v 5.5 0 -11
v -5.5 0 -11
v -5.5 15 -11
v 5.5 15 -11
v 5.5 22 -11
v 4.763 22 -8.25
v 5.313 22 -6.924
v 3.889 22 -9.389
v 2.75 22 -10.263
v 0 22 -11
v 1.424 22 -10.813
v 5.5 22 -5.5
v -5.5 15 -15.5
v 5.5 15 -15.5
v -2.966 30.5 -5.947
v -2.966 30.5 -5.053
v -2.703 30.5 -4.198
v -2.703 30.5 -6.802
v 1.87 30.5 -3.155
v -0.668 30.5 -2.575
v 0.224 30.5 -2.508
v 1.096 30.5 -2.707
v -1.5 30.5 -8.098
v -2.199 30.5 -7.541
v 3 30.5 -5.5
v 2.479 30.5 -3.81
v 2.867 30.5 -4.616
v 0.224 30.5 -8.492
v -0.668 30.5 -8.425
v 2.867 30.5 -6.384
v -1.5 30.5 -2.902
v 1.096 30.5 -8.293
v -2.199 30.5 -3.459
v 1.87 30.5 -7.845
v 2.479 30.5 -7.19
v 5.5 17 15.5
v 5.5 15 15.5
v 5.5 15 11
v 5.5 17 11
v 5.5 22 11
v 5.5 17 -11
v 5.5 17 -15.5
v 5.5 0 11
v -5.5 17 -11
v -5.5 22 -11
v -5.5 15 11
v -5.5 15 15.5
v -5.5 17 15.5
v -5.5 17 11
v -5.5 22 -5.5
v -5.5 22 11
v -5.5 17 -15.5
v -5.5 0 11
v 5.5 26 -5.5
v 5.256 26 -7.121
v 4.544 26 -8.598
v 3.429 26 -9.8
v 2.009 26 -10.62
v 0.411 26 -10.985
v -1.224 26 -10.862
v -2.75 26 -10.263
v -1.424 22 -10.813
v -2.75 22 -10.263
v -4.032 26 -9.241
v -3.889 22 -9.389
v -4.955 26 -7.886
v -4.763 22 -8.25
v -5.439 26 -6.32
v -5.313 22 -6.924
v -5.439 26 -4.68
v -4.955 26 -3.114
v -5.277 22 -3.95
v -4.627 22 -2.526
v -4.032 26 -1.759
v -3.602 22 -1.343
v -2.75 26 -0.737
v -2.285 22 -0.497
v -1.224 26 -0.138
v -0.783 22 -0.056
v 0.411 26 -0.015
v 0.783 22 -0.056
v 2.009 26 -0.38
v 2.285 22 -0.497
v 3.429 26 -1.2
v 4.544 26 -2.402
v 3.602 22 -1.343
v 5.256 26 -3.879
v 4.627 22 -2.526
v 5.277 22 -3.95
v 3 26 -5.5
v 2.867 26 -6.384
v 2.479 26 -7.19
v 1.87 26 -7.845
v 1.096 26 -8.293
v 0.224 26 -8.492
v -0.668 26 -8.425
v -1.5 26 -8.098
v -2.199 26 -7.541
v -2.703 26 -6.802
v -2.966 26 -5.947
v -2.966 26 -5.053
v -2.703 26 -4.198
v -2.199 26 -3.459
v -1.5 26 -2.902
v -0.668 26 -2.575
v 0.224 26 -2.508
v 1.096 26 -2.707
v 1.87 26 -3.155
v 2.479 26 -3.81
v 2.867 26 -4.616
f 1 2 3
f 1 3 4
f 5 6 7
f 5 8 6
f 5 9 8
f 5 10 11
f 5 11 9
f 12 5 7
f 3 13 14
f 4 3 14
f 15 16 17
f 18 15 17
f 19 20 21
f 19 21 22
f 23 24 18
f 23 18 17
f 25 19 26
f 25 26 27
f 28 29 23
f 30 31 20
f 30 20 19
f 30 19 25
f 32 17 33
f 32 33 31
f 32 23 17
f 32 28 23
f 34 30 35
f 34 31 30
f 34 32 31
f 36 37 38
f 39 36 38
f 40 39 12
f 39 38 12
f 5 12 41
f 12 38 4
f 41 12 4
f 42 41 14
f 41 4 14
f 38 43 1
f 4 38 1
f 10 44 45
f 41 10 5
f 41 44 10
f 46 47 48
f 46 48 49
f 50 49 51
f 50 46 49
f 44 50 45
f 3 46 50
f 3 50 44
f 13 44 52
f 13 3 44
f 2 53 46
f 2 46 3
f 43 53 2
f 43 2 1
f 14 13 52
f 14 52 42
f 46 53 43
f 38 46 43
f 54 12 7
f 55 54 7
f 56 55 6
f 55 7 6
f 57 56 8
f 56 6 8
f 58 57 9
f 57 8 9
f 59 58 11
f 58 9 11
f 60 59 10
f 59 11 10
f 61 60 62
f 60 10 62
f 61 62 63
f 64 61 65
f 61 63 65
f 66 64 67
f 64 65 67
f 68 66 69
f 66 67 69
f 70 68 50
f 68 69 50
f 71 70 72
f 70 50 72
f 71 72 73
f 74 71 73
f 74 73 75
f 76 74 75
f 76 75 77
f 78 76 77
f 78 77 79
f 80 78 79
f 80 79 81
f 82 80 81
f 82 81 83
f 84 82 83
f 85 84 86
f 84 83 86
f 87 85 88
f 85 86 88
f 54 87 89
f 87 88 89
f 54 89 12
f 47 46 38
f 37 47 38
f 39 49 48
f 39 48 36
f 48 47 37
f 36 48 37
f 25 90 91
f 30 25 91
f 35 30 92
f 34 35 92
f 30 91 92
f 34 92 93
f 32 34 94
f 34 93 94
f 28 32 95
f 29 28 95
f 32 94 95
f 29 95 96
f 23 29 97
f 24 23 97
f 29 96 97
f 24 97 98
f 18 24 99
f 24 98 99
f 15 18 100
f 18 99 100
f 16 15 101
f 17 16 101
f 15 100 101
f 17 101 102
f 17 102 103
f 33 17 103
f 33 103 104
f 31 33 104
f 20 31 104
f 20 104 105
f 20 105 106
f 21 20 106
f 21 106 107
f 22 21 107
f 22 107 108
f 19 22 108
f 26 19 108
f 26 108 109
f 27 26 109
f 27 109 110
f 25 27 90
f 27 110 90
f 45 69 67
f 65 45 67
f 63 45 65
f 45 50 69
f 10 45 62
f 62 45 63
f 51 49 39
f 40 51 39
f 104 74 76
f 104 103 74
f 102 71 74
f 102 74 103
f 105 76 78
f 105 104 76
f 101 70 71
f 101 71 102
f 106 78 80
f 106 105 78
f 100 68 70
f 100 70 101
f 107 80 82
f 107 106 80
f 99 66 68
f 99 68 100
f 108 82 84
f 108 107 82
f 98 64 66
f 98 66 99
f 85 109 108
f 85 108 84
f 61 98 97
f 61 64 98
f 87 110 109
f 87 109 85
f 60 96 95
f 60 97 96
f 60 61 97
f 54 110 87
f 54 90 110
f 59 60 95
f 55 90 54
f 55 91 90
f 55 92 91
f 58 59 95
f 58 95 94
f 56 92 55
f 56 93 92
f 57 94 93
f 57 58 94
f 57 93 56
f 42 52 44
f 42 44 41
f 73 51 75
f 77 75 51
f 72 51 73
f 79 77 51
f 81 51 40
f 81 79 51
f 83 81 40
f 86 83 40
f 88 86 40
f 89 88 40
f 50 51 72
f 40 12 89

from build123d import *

# Parameters (mm, degrees)
SKETCH2_W           = 11
SKETCH2_H           = 22
BOSS_EXTRUDE1_DEPTH = 22
SKETCH3_W           = 11
SKETCH3_H           = 4.5
BOSS_EXTRUDE2_DEPTH = 2
SKETCH4_R           = 5.5
BOSS_EXTRUDE3_DEPTH = 4
SKETCH5_R           = 3
BOSS_EXTRUDE4_DEPTH = 4.5


with BuildPart() as part:
    # Sketch2 → Boss-Extrude1 (new body)
    with BuildSketch(Plane(origin=(0, 0, 0), x_dir=(1, 0, 0), z_dir=(0, 1, 0))):
        Rectangle(SKETCH2_W, SKETCH2_H)
    extrude(amount=BOSS_EXTRUDE1_DEPTH)

    # Sketch3 → Boss-Extrude2 (add)
    with BuildSketch(Plane(origin=(0, 15, 0), x_dir=(1, 0, 0), z_dir=(0, 1, 0))):
        with Locations((0, 13.25)):
            Rectangle(SKETCH3_W, SKETCH3_H)
        with Locations((0, -13.25)):
            Rectangle(SKETCH3_W, SKETCH3_H)
    extrude(amount=BOSS_EXTRUDE2_DEPTH)

    # Sketch4 → Boss-Extrude3 (add)
    with BuildSketch(Plane(origin=(0, 22, 0), x_dir=(1, 0, 0), z_dir=(0, 1, 0))):
        with Locations((0, 5.5)):
            Circle(SKETCH4_R)
    extrude(amount=BOSS_EXTRUDE3_DEPTH)

    # Sketch5 → Boss-Extrude4 (add)
    with BuildSketch(Plane(origin=(0, 26, 0), x_dir=(1, 0, 0), z_dir=(0, 1, 0))):
        with Locations((0, 5.5)):
            Circle(SKETCH5_R)
    extrude(amount=BOSS_EXTRUDE4_DEPTH)


solid = part.part
